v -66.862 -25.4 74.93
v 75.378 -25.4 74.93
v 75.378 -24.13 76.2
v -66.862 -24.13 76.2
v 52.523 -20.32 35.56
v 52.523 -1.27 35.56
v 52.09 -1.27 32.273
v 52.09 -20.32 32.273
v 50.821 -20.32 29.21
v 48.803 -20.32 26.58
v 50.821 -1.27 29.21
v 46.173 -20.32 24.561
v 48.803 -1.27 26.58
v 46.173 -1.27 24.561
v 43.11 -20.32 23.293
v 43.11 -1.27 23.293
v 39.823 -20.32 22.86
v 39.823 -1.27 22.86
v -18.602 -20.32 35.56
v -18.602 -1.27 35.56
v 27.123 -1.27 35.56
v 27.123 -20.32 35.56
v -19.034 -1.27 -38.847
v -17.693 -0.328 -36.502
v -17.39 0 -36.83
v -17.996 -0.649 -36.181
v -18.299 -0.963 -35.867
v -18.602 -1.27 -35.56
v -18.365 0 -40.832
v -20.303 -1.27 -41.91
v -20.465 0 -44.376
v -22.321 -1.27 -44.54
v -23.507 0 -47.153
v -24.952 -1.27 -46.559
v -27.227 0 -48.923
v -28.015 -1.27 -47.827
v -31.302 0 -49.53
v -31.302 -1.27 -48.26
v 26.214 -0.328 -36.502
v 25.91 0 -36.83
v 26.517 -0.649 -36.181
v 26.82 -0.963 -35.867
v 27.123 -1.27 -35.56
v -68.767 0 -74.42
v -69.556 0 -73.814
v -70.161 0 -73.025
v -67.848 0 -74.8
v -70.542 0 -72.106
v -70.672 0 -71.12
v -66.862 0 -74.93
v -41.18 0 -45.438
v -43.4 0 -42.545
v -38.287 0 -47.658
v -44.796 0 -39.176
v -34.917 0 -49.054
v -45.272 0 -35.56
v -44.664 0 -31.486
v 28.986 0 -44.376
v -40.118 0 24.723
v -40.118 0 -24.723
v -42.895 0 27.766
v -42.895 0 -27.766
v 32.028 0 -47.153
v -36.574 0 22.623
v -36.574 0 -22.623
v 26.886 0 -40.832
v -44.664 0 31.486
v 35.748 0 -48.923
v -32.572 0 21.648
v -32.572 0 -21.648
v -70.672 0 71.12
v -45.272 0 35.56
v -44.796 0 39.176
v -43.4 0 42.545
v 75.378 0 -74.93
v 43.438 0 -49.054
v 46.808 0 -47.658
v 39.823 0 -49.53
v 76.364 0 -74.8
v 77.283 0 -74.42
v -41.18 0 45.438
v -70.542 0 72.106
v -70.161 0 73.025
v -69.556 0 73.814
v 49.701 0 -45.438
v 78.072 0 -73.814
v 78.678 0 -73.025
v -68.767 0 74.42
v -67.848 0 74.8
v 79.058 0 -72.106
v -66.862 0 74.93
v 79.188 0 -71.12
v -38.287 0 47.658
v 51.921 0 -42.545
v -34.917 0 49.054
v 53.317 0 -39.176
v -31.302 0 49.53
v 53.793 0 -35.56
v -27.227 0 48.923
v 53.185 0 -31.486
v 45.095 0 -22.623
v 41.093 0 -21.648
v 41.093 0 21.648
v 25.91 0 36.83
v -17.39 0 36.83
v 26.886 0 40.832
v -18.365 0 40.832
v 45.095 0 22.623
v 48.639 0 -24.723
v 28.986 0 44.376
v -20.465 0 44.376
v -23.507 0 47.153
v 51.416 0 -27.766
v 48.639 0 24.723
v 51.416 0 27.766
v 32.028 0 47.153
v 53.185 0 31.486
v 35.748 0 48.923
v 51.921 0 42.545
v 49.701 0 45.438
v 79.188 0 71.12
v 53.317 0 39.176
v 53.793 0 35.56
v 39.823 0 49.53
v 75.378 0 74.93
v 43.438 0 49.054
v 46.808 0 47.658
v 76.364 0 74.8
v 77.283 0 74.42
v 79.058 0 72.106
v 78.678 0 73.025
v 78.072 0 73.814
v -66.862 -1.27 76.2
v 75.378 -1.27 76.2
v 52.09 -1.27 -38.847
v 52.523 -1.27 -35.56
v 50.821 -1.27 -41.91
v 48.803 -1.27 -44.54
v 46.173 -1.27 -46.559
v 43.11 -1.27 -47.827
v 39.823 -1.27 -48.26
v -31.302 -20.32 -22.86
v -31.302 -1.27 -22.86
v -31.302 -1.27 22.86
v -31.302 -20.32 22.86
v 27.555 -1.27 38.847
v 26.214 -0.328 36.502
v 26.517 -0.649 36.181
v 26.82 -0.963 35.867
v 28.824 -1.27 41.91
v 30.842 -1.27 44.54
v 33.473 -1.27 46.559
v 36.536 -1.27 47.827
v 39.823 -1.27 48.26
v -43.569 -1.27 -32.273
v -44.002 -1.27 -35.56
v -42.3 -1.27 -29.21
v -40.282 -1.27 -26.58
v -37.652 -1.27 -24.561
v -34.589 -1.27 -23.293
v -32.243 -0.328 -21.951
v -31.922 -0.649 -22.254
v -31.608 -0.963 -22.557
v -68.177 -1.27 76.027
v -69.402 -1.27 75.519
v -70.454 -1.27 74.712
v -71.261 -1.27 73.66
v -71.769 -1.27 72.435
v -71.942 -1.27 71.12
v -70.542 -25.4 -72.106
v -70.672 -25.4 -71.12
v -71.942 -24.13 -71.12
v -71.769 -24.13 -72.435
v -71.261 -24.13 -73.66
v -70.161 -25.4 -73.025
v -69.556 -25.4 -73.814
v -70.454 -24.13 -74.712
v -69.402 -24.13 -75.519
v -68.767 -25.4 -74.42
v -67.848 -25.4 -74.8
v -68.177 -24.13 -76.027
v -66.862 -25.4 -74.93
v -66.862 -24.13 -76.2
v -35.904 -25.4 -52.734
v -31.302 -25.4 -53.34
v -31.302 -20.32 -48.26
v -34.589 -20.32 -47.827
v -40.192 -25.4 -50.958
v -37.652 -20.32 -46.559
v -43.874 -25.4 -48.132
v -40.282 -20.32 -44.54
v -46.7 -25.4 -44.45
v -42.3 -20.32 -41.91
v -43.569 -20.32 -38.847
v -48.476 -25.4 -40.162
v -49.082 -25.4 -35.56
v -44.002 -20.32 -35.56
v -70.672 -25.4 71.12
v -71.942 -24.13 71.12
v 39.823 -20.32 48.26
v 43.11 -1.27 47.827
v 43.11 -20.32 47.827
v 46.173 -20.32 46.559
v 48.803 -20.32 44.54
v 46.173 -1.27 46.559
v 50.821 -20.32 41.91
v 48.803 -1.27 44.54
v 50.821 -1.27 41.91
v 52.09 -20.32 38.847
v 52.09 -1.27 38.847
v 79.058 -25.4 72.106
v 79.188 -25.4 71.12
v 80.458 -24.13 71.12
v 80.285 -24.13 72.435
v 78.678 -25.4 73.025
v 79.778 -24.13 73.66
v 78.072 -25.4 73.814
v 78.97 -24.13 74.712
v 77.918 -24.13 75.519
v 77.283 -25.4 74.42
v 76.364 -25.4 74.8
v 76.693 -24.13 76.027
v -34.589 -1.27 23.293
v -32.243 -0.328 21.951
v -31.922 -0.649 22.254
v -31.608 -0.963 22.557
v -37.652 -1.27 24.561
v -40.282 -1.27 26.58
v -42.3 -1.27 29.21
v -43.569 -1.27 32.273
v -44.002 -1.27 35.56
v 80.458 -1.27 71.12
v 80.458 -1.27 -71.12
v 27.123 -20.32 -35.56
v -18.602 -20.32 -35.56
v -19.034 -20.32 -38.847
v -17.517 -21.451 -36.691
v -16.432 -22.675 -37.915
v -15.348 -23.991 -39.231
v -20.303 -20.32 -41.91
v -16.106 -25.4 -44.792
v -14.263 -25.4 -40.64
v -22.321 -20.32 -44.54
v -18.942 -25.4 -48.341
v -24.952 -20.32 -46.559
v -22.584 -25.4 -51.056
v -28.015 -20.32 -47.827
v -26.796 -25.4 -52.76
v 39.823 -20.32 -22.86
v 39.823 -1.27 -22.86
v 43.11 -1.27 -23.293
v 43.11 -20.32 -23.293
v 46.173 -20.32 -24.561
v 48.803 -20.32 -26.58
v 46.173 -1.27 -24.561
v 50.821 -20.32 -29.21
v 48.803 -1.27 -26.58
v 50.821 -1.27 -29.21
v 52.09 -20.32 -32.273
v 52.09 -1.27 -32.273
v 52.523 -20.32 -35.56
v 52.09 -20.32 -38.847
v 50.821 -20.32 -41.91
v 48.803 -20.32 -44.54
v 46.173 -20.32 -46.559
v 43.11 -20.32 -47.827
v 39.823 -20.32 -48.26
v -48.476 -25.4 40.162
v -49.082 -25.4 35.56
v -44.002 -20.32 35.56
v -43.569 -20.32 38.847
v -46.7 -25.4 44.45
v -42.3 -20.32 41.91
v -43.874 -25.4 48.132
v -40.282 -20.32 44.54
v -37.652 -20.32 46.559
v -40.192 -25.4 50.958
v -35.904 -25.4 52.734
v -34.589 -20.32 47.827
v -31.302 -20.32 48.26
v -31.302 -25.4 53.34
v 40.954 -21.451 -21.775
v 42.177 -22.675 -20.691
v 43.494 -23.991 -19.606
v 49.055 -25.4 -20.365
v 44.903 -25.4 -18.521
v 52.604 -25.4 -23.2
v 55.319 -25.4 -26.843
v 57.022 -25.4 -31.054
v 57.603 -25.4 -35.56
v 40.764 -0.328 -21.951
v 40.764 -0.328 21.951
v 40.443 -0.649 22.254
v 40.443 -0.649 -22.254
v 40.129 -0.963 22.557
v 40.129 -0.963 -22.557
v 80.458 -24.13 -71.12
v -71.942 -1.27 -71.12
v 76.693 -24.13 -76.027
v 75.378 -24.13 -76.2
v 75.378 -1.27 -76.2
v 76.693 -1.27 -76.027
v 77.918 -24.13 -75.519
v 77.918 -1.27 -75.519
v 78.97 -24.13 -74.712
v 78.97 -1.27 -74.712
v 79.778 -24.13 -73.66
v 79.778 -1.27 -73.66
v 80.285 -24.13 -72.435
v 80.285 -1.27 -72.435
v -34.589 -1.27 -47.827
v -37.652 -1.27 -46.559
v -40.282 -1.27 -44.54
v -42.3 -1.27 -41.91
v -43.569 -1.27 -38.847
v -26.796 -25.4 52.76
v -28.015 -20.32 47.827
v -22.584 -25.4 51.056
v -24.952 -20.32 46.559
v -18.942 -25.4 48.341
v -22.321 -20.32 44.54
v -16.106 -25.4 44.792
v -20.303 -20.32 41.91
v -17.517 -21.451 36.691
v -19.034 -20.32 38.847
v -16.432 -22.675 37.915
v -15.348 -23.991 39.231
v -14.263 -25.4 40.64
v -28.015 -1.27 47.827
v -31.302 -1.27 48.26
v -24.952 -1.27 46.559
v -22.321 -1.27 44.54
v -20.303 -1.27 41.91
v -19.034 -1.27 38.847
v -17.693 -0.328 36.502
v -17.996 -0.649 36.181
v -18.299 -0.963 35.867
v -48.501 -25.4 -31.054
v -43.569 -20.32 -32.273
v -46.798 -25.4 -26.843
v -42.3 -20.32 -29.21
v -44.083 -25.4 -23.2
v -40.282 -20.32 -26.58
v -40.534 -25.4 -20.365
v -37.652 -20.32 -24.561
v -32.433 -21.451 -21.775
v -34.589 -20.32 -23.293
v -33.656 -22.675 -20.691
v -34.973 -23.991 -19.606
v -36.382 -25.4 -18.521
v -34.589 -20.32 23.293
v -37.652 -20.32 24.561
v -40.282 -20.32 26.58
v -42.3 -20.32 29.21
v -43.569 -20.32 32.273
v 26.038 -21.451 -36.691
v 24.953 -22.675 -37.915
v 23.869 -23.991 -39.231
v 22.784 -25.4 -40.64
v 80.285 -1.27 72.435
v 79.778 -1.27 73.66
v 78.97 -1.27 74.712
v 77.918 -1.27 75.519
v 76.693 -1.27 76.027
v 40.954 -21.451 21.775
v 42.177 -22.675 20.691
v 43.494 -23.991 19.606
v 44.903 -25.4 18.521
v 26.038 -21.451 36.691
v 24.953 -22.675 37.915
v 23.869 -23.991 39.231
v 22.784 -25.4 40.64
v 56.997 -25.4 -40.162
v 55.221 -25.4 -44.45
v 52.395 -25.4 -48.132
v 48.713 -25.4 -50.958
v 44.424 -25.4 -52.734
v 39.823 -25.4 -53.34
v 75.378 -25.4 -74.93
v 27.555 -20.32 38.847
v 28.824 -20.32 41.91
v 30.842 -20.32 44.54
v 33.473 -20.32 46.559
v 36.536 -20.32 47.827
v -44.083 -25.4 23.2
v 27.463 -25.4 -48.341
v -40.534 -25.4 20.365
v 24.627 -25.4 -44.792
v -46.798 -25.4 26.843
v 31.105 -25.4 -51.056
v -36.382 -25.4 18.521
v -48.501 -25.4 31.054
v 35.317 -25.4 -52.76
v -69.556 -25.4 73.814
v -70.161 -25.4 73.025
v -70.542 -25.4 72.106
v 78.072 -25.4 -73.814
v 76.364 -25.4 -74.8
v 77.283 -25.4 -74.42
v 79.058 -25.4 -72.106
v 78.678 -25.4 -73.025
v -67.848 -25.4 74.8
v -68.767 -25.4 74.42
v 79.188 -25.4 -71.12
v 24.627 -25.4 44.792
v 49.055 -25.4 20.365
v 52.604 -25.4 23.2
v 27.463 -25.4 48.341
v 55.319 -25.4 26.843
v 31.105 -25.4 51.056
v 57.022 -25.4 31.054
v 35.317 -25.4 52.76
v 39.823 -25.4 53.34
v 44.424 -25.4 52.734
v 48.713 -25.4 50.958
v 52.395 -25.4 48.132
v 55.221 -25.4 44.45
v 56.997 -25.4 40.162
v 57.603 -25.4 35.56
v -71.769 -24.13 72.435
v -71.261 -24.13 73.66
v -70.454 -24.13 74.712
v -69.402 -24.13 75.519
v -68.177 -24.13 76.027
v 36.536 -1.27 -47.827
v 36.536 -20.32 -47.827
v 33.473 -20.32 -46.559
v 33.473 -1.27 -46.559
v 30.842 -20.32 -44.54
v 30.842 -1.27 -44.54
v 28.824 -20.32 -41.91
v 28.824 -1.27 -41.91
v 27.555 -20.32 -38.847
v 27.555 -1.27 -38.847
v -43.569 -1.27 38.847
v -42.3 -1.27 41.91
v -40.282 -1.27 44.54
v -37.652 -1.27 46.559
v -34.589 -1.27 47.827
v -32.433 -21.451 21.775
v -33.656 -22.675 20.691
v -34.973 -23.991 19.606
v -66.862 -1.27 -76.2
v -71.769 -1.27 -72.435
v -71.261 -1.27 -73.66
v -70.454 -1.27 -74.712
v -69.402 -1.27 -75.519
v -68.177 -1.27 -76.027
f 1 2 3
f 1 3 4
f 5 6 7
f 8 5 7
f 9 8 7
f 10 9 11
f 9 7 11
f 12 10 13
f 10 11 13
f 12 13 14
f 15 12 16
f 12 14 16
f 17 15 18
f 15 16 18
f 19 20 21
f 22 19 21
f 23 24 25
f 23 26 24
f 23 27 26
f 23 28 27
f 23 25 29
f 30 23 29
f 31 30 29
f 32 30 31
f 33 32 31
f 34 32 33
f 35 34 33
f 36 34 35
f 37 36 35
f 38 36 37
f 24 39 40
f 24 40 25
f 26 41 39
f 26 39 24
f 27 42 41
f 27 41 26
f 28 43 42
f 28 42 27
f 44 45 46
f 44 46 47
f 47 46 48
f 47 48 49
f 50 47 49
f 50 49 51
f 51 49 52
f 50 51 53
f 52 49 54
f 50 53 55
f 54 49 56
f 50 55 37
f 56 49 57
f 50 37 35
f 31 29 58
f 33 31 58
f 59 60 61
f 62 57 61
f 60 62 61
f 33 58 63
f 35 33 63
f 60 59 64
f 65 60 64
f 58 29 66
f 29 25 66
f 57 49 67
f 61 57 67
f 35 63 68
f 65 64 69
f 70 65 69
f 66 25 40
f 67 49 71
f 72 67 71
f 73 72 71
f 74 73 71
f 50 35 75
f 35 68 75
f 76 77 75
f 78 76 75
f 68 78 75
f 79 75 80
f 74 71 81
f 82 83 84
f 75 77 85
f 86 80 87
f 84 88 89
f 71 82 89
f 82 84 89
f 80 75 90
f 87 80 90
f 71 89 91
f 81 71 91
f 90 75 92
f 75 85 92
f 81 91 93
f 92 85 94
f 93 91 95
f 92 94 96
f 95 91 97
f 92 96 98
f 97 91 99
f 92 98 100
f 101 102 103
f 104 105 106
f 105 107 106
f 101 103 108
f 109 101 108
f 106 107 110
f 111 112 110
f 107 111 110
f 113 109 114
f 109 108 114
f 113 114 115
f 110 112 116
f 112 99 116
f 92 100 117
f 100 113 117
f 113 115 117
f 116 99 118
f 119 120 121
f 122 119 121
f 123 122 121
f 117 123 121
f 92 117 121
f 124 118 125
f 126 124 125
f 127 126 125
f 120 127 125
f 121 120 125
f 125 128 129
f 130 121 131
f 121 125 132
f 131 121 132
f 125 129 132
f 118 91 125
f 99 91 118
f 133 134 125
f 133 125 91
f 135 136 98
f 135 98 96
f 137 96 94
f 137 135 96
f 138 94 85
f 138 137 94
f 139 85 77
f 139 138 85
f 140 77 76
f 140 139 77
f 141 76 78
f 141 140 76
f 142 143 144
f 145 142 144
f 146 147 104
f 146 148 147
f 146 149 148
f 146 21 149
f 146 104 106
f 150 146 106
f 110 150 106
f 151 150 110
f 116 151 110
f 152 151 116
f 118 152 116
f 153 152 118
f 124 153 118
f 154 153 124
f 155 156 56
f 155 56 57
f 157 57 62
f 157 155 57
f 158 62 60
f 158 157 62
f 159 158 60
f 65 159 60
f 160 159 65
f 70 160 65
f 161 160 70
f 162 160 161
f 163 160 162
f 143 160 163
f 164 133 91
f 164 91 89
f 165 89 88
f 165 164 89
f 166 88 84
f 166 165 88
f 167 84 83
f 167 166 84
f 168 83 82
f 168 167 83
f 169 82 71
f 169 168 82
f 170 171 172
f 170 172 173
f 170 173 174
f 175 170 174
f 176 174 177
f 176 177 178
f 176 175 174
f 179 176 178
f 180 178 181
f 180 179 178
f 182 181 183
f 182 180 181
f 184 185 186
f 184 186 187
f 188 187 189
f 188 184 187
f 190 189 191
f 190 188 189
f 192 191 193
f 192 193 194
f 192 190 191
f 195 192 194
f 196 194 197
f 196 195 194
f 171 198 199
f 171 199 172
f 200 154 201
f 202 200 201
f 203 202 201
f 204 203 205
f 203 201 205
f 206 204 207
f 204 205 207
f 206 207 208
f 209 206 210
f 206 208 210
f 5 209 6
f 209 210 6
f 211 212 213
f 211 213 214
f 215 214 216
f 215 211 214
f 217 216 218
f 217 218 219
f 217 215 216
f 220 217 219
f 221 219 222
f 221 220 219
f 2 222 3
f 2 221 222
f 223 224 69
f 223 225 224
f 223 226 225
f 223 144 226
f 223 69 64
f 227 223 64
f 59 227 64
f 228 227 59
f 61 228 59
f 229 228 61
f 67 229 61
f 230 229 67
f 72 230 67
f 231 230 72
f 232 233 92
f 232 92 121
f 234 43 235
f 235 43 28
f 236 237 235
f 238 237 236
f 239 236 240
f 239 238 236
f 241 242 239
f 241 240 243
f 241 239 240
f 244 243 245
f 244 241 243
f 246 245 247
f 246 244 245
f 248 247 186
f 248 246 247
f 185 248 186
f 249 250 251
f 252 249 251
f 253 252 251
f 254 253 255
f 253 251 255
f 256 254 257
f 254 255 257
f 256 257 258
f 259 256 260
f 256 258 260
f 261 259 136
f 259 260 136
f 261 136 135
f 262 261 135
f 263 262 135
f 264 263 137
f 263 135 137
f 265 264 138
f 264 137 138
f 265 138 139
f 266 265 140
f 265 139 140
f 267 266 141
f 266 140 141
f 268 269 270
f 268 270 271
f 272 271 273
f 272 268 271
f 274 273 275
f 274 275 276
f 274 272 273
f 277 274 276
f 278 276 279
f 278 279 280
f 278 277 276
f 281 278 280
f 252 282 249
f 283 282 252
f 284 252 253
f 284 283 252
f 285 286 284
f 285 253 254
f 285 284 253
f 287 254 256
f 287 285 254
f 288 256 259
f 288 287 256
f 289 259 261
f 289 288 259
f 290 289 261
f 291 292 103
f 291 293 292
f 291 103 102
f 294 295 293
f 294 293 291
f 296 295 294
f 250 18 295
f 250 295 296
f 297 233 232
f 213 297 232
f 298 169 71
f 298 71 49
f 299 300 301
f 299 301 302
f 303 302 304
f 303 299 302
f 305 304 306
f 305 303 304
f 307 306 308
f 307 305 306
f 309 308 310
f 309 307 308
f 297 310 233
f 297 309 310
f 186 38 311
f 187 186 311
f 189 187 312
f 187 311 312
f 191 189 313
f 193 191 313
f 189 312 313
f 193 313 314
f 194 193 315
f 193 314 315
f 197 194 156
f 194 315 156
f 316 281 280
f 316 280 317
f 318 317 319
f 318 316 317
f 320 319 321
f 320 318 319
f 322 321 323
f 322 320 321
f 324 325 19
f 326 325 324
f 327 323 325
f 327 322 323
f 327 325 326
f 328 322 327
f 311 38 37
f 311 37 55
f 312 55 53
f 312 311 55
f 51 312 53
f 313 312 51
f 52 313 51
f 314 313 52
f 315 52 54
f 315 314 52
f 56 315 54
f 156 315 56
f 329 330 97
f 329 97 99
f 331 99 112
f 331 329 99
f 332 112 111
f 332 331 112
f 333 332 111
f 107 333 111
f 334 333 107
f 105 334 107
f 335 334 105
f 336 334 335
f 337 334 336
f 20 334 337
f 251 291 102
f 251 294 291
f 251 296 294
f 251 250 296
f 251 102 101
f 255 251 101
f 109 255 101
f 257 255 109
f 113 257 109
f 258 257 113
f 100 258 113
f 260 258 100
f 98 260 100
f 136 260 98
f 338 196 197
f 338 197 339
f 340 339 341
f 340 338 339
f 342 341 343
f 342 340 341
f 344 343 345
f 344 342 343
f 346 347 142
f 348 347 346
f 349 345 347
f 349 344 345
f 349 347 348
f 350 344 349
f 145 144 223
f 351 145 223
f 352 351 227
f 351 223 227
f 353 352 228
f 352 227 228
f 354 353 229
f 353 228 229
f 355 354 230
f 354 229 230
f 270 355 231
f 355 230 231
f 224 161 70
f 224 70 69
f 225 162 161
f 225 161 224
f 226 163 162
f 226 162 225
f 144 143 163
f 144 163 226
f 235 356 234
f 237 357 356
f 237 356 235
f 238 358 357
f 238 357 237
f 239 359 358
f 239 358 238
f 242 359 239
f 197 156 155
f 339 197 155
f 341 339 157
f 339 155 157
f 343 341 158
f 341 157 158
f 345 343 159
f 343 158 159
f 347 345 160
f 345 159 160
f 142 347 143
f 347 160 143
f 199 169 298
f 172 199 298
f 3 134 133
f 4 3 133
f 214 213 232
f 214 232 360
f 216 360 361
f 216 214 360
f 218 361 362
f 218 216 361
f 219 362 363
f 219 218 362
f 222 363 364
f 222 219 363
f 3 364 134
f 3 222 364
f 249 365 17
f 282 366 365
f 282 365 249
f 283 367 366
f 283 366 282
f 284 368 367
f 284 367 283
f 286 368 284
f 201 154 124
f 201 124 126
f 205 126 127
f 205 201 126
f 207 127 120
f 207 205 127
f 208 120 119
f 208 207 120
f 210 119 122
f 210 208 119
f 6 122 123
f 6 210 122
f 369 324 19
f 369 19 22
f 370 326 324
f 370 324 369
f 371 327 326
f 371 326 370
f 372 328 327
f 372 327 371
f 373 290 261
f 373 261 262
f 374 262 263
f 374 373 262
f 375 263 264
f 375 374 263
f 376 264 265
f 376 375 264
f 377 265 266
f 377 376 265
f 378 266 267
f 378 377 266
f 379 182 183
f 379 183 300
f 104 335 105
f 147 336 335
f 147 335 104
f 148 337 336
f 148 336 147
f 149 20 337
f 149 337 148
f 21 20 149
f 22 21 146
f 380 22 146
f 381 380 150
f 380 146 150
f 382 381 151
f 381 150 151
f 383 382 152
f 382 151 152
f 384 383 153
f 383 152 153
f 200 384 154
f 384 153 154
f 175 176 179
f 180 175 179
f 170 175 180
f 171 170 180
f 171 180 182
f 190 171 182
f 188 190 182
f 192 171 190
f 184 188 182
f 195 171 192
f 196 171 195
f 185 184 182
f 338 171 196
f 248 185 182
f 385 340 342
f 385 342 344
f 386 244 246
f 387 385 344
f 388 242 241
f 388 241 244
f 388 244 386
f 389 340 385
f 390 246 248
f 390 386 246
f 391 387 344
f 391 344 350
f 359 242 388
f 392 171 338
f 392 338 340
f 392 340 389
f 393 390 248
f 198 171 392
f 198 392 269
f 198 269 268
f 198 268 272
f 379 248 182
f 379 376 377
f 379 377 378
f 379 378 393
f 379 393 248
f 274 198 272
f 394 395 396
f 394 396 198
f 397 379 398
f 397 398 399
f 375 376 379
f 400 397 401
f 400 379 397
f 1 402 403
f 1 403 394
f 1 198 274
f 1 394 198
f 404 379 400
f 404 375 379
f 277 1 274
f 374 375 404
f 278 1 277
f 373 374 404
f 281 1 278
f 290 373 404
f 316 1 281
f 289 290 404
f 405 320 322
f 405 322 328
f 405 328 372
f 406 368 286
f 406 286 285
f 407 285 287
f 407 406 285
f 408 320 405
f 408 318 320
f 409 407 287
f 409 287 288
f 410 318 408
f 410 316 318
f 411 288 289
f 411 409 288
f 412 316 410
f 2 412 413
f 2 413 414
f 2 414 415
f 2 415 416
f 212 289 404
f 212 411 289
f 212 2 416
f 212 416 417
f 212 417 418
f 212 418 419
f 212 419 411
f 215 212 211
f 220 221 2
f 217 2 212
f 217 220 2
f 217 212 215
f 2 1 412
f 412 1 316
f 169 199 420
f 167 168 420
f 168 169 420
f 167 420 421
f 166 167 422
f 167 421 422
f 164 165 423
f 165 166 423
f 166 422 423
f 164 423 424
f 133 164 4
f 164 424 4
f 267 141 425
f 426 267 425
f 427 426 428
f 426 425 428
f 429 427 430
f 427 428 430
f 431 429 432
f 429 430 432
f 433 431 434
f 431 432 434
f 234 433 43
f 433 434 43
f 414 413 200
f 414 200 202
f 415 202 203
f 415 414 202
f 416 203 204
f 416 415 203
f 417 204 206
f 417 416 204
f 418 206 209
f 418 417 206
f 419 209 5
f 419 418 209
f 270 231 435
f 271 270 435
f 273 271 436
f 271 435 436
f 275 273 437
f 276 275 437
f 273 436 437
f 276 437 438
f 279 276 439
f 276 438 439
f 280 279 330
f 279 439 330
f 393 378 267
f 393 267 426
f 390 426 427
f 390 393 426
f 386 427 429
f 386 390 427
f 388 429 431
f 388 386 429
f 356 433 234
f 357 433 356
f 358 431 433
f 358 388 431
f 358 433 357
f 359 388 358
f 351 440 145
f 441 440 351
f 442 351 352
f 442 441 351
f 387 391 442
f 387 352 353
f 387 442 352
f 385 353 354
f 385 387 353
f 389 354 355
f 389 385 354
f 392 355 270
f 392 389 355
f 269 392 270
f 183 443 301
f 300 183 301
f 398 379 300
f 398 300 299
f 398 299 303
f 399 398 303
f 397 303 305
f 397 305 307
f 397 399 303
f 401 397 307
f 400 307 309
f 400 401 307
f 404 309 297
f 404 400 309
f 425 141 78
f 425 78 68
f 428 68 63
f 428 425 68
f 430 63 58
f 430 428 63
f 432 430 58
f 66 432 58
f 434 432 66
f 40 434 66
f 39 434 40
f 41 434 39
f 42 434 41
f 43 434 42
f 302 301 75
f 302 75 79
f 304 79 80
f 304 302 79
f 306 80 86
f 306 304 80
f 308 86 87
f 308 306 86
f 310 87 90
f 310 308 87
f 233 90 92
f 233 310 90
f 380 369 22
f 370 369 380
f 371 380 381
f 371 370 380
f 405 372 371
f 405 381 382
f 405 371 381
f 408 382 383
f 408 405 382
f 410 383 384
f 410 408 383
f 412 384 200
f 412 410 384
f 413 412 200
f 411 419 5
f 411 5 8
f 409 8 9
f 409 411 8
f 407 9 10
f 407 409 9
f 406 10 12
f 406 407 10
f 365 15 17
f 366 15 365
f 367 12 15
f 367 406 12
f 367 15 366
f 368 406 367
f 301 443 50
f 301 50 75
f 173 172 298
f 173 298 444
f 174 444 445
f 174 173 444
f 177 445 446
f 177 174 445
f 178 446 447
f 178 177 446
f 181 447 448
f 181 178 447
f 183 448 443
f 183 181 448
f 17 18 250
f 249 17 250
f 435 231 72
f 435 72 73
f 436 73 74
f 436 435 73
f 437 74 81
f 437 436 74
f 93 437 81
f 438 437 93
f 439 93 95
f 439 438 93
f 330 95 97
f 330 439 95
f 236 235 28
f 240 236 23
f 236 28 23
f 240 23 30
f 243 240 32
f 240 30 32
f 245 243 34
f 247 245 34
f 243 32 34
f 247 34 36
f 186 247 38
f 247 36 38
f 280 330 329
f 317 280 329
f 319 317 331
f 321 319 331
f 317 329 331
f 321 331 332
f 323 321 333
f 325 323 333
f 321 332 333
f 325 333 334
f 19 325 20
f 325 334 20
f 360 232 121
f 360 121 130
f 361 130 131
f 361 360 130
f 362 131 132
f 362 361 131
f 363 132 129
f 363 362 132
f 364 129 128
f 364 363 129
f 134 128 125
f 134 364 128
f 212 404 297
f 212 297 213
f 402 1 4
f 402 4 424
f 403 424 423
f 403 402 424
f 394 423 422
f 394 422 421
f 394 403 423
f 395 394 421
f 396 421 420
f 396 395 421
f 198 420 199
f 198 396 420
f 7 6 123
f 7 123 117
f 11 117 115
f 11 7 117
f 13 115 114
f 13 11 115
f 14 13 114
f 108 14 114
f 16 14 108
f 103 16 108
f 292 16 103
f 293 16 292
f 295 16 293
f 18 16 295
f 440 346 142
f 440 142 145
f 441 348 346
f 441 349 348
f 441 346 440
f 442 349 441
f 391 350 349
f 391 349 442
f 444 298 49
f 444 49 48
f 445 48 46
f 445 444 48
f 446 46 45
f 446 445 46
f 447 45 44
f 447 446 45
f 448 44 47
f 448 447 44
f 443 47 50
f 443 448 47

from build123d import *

# Parameters (mm, degrees)
F1_DEPTH = 25.4
F2_SIZE  = 5.08
F3_R     = 5.08
F4_SIZE  = 1.27


with BuildPart() as f1:
    # F0 (on Front) → F1 (new body)
    with BuildSketch(Plane.XZ):
        with BuildLine():
            Line((-31.3017520181, 76.2), (-71.9417520181, 76.2))
            Line((-71.9417520181, 76.2), (-71.9417520181, 35.56))
            Line((-71.9417520181, 35.56), (-44.0017520181, 35.56))
            ThreePointArc((-44.0017520181, 35.56), (-40.2820081392, 44.5402561211), (-31.3017520181, 48.26))
            Line((-31.3017520181, 48.26), (-31.3017520181, 76.2))
        make_face()
        with BuildLine():
            Line((80.4582479819, 76.2), (-31.3017520181, 76.2))
            Line((-31.3017520181, 76.2), (-31.3017520181, 48.26))
            ThreePointArc((-31.3017520181, 48.26), (-22.3214958971, 44.5402561211), (-18.6017520181, 35.56))
            Line((-18.6017520181, 35.56), (27.1226329476, 35.56))
            ThreePointArc((27.1226329476, 35.56), (30.8423768265, 44.5402561211), (39.8226329476, 48.26))
            ThreePointArc((39.8226329476, 48.26), (48.8028890686, 44.5402561211), (52.5226329476, 35.56))
            Line((52.5226329476, 35.56), (80.4582479819, 35.56))
            Line((80.4582479819, 35.56), (80.4582479819, 76.2))
        make_face()
        with BuildLine():
            Line((-44.0017520181, 35.56), (-71.9417520181, 35.56))
            Line((-71.9417520181, 35.56), (-71.9417520181, -35.56))
            Line((-71.9417520181, -35.56), (-44.0017520181, -35.56))
            ThreePointArc((-44.0017520181, -35.56), (-40.2820081392, -26.5797438789), (-31.3017520181, -22.86))
            Line((-31.3017520181, -22.86), (-31.3017520181, 22.86))
            ThreePointArc((-31.3017520181, 22.86), (-40.2820081392, 26.5797438789), (-44.0017520181, 35.56))
        make_face()
        with BuildLine():
            Line((-44.0017520181, -35.56), (-71.9417520181, -35.56))
            Line((-71.9417520181, -35.56), (-71.9417520181, -76.2))
            Line((-71.9417520181, -76.2), (-31.3017520181, -76.2))
            Line((-31.3017520181, -76.2), (-31.3017520181, -48.26))
            ThreePointArc((-31.3017520181, -48.26), (-40.2820081392, -44.5402561211), (-44.0017520181, -35.56))
        make_face()
        with BuildLine():
            Line((80.4582479819, -35.56), (80.4582479819, 35.56))
            Line((80.4582479819, 35.56), (52.5226329476, 35.56))
            ThreePointArc((52.5226329476, 35.56), (48.8028890686, 26.5797438789), (39.8226329476, 22.86))
            Line((39.8226329476, 22.86), (39.8226329476, -22.86))
            ThreePointArc((39.8226329476, -22.86), (48.8028890686, -26.5797438789), (52.5226329476, -35.56))
            Line((52.5226329476, -35.56), (80.4582479819, -35.56))
        make_face()
        with BuildLine():
            Line((80.4582479819, -76.2), (80.4582479819, -35.56))
            Line((80.4582479819, -35.56), (52.5226329476, -35.56))
            ThreePointArc((52.5226329476, -35.56), (48.8028890686, -44.5402561211), (39.8226329476, -48.26))
            Line((39.8226329476, -48.26), (39.8226329476, -76.2))
            Line((39.8226329476, -76.2), (80.4582479819, -76.2))
        make_face()
        with BuildLine():
            Line((-31.3017520181, -48.26), (-31.3017520181, -76.2))
            Line((-31.3017520181, -76.2), (39.8226329476, -76.2))
            Line((39.8226329476, -76.2), (39.8226329476, -48.26))
            ThreePointArc((39.8226329476, -48.26), (30.8423768265, -44.5402561211), (27.1226329476, -35.56))
            Line((27.1226329476, -35.56), (-18.6017520181, -35.56))
            ThreePointArc((-18.6017520181, -35.56), (-22.3214958971, -44.5402561211), (-31.3017520181, -48.26))
        make_face()
    extrude(amount=F1_DEPTH)

    # F2
    f2_edges = [f1.edges().sort_by_distance(p)[0] for p in [
        (39.822633, -25.4, 0),
        (4.26044, -25.4, 35.56),
        (4.26044, -25.4, -35.56),
        (48.802889, -25.4, 44.540256),
        (48.802889, -25.4, -44.540256),
        (-40.282008, -25.4, -44.540256),
        (-31.301752, -25.4, 0),
        (-40.282008, -25.4, 44.540256),
    ]]
    chamfer(f2_edges, length=F2_SIZE)

    # F3
    f3_edges = [f1.edges().sort_by_distance(p)[0] for p in [
        (80.458248, -12.7, 76.2),
        (80.458248, -12.7, -76.2),
        (-71.941752, -12.7, -76.2),
        (-71.941752, -12.7, 76.2),
    ]]
    fillet(f3_edges, radius=F3_R)

    # F4
    f4_edges = [f1.edges().sort_by_distance(p)[0] for p in [
        (4.258248, -25.4, 76.2),
        (-71.941752, 0, 0),
        (4.26044, 0, 35.56),
        (-40.282008, 0, 44.540256),
        (-31.301752, 0, 0),
        (39.822633, 0, 0),
        (48.802889, 0, 44.540256),
        (4.26044, 0, -35.56),
        (-40.282008, 0, -44.540256),
        (48.802889, 0, -44.540256),
    ]]
    chamfer(f4_edges, length=F4_SIZE)


solid = f1.part
